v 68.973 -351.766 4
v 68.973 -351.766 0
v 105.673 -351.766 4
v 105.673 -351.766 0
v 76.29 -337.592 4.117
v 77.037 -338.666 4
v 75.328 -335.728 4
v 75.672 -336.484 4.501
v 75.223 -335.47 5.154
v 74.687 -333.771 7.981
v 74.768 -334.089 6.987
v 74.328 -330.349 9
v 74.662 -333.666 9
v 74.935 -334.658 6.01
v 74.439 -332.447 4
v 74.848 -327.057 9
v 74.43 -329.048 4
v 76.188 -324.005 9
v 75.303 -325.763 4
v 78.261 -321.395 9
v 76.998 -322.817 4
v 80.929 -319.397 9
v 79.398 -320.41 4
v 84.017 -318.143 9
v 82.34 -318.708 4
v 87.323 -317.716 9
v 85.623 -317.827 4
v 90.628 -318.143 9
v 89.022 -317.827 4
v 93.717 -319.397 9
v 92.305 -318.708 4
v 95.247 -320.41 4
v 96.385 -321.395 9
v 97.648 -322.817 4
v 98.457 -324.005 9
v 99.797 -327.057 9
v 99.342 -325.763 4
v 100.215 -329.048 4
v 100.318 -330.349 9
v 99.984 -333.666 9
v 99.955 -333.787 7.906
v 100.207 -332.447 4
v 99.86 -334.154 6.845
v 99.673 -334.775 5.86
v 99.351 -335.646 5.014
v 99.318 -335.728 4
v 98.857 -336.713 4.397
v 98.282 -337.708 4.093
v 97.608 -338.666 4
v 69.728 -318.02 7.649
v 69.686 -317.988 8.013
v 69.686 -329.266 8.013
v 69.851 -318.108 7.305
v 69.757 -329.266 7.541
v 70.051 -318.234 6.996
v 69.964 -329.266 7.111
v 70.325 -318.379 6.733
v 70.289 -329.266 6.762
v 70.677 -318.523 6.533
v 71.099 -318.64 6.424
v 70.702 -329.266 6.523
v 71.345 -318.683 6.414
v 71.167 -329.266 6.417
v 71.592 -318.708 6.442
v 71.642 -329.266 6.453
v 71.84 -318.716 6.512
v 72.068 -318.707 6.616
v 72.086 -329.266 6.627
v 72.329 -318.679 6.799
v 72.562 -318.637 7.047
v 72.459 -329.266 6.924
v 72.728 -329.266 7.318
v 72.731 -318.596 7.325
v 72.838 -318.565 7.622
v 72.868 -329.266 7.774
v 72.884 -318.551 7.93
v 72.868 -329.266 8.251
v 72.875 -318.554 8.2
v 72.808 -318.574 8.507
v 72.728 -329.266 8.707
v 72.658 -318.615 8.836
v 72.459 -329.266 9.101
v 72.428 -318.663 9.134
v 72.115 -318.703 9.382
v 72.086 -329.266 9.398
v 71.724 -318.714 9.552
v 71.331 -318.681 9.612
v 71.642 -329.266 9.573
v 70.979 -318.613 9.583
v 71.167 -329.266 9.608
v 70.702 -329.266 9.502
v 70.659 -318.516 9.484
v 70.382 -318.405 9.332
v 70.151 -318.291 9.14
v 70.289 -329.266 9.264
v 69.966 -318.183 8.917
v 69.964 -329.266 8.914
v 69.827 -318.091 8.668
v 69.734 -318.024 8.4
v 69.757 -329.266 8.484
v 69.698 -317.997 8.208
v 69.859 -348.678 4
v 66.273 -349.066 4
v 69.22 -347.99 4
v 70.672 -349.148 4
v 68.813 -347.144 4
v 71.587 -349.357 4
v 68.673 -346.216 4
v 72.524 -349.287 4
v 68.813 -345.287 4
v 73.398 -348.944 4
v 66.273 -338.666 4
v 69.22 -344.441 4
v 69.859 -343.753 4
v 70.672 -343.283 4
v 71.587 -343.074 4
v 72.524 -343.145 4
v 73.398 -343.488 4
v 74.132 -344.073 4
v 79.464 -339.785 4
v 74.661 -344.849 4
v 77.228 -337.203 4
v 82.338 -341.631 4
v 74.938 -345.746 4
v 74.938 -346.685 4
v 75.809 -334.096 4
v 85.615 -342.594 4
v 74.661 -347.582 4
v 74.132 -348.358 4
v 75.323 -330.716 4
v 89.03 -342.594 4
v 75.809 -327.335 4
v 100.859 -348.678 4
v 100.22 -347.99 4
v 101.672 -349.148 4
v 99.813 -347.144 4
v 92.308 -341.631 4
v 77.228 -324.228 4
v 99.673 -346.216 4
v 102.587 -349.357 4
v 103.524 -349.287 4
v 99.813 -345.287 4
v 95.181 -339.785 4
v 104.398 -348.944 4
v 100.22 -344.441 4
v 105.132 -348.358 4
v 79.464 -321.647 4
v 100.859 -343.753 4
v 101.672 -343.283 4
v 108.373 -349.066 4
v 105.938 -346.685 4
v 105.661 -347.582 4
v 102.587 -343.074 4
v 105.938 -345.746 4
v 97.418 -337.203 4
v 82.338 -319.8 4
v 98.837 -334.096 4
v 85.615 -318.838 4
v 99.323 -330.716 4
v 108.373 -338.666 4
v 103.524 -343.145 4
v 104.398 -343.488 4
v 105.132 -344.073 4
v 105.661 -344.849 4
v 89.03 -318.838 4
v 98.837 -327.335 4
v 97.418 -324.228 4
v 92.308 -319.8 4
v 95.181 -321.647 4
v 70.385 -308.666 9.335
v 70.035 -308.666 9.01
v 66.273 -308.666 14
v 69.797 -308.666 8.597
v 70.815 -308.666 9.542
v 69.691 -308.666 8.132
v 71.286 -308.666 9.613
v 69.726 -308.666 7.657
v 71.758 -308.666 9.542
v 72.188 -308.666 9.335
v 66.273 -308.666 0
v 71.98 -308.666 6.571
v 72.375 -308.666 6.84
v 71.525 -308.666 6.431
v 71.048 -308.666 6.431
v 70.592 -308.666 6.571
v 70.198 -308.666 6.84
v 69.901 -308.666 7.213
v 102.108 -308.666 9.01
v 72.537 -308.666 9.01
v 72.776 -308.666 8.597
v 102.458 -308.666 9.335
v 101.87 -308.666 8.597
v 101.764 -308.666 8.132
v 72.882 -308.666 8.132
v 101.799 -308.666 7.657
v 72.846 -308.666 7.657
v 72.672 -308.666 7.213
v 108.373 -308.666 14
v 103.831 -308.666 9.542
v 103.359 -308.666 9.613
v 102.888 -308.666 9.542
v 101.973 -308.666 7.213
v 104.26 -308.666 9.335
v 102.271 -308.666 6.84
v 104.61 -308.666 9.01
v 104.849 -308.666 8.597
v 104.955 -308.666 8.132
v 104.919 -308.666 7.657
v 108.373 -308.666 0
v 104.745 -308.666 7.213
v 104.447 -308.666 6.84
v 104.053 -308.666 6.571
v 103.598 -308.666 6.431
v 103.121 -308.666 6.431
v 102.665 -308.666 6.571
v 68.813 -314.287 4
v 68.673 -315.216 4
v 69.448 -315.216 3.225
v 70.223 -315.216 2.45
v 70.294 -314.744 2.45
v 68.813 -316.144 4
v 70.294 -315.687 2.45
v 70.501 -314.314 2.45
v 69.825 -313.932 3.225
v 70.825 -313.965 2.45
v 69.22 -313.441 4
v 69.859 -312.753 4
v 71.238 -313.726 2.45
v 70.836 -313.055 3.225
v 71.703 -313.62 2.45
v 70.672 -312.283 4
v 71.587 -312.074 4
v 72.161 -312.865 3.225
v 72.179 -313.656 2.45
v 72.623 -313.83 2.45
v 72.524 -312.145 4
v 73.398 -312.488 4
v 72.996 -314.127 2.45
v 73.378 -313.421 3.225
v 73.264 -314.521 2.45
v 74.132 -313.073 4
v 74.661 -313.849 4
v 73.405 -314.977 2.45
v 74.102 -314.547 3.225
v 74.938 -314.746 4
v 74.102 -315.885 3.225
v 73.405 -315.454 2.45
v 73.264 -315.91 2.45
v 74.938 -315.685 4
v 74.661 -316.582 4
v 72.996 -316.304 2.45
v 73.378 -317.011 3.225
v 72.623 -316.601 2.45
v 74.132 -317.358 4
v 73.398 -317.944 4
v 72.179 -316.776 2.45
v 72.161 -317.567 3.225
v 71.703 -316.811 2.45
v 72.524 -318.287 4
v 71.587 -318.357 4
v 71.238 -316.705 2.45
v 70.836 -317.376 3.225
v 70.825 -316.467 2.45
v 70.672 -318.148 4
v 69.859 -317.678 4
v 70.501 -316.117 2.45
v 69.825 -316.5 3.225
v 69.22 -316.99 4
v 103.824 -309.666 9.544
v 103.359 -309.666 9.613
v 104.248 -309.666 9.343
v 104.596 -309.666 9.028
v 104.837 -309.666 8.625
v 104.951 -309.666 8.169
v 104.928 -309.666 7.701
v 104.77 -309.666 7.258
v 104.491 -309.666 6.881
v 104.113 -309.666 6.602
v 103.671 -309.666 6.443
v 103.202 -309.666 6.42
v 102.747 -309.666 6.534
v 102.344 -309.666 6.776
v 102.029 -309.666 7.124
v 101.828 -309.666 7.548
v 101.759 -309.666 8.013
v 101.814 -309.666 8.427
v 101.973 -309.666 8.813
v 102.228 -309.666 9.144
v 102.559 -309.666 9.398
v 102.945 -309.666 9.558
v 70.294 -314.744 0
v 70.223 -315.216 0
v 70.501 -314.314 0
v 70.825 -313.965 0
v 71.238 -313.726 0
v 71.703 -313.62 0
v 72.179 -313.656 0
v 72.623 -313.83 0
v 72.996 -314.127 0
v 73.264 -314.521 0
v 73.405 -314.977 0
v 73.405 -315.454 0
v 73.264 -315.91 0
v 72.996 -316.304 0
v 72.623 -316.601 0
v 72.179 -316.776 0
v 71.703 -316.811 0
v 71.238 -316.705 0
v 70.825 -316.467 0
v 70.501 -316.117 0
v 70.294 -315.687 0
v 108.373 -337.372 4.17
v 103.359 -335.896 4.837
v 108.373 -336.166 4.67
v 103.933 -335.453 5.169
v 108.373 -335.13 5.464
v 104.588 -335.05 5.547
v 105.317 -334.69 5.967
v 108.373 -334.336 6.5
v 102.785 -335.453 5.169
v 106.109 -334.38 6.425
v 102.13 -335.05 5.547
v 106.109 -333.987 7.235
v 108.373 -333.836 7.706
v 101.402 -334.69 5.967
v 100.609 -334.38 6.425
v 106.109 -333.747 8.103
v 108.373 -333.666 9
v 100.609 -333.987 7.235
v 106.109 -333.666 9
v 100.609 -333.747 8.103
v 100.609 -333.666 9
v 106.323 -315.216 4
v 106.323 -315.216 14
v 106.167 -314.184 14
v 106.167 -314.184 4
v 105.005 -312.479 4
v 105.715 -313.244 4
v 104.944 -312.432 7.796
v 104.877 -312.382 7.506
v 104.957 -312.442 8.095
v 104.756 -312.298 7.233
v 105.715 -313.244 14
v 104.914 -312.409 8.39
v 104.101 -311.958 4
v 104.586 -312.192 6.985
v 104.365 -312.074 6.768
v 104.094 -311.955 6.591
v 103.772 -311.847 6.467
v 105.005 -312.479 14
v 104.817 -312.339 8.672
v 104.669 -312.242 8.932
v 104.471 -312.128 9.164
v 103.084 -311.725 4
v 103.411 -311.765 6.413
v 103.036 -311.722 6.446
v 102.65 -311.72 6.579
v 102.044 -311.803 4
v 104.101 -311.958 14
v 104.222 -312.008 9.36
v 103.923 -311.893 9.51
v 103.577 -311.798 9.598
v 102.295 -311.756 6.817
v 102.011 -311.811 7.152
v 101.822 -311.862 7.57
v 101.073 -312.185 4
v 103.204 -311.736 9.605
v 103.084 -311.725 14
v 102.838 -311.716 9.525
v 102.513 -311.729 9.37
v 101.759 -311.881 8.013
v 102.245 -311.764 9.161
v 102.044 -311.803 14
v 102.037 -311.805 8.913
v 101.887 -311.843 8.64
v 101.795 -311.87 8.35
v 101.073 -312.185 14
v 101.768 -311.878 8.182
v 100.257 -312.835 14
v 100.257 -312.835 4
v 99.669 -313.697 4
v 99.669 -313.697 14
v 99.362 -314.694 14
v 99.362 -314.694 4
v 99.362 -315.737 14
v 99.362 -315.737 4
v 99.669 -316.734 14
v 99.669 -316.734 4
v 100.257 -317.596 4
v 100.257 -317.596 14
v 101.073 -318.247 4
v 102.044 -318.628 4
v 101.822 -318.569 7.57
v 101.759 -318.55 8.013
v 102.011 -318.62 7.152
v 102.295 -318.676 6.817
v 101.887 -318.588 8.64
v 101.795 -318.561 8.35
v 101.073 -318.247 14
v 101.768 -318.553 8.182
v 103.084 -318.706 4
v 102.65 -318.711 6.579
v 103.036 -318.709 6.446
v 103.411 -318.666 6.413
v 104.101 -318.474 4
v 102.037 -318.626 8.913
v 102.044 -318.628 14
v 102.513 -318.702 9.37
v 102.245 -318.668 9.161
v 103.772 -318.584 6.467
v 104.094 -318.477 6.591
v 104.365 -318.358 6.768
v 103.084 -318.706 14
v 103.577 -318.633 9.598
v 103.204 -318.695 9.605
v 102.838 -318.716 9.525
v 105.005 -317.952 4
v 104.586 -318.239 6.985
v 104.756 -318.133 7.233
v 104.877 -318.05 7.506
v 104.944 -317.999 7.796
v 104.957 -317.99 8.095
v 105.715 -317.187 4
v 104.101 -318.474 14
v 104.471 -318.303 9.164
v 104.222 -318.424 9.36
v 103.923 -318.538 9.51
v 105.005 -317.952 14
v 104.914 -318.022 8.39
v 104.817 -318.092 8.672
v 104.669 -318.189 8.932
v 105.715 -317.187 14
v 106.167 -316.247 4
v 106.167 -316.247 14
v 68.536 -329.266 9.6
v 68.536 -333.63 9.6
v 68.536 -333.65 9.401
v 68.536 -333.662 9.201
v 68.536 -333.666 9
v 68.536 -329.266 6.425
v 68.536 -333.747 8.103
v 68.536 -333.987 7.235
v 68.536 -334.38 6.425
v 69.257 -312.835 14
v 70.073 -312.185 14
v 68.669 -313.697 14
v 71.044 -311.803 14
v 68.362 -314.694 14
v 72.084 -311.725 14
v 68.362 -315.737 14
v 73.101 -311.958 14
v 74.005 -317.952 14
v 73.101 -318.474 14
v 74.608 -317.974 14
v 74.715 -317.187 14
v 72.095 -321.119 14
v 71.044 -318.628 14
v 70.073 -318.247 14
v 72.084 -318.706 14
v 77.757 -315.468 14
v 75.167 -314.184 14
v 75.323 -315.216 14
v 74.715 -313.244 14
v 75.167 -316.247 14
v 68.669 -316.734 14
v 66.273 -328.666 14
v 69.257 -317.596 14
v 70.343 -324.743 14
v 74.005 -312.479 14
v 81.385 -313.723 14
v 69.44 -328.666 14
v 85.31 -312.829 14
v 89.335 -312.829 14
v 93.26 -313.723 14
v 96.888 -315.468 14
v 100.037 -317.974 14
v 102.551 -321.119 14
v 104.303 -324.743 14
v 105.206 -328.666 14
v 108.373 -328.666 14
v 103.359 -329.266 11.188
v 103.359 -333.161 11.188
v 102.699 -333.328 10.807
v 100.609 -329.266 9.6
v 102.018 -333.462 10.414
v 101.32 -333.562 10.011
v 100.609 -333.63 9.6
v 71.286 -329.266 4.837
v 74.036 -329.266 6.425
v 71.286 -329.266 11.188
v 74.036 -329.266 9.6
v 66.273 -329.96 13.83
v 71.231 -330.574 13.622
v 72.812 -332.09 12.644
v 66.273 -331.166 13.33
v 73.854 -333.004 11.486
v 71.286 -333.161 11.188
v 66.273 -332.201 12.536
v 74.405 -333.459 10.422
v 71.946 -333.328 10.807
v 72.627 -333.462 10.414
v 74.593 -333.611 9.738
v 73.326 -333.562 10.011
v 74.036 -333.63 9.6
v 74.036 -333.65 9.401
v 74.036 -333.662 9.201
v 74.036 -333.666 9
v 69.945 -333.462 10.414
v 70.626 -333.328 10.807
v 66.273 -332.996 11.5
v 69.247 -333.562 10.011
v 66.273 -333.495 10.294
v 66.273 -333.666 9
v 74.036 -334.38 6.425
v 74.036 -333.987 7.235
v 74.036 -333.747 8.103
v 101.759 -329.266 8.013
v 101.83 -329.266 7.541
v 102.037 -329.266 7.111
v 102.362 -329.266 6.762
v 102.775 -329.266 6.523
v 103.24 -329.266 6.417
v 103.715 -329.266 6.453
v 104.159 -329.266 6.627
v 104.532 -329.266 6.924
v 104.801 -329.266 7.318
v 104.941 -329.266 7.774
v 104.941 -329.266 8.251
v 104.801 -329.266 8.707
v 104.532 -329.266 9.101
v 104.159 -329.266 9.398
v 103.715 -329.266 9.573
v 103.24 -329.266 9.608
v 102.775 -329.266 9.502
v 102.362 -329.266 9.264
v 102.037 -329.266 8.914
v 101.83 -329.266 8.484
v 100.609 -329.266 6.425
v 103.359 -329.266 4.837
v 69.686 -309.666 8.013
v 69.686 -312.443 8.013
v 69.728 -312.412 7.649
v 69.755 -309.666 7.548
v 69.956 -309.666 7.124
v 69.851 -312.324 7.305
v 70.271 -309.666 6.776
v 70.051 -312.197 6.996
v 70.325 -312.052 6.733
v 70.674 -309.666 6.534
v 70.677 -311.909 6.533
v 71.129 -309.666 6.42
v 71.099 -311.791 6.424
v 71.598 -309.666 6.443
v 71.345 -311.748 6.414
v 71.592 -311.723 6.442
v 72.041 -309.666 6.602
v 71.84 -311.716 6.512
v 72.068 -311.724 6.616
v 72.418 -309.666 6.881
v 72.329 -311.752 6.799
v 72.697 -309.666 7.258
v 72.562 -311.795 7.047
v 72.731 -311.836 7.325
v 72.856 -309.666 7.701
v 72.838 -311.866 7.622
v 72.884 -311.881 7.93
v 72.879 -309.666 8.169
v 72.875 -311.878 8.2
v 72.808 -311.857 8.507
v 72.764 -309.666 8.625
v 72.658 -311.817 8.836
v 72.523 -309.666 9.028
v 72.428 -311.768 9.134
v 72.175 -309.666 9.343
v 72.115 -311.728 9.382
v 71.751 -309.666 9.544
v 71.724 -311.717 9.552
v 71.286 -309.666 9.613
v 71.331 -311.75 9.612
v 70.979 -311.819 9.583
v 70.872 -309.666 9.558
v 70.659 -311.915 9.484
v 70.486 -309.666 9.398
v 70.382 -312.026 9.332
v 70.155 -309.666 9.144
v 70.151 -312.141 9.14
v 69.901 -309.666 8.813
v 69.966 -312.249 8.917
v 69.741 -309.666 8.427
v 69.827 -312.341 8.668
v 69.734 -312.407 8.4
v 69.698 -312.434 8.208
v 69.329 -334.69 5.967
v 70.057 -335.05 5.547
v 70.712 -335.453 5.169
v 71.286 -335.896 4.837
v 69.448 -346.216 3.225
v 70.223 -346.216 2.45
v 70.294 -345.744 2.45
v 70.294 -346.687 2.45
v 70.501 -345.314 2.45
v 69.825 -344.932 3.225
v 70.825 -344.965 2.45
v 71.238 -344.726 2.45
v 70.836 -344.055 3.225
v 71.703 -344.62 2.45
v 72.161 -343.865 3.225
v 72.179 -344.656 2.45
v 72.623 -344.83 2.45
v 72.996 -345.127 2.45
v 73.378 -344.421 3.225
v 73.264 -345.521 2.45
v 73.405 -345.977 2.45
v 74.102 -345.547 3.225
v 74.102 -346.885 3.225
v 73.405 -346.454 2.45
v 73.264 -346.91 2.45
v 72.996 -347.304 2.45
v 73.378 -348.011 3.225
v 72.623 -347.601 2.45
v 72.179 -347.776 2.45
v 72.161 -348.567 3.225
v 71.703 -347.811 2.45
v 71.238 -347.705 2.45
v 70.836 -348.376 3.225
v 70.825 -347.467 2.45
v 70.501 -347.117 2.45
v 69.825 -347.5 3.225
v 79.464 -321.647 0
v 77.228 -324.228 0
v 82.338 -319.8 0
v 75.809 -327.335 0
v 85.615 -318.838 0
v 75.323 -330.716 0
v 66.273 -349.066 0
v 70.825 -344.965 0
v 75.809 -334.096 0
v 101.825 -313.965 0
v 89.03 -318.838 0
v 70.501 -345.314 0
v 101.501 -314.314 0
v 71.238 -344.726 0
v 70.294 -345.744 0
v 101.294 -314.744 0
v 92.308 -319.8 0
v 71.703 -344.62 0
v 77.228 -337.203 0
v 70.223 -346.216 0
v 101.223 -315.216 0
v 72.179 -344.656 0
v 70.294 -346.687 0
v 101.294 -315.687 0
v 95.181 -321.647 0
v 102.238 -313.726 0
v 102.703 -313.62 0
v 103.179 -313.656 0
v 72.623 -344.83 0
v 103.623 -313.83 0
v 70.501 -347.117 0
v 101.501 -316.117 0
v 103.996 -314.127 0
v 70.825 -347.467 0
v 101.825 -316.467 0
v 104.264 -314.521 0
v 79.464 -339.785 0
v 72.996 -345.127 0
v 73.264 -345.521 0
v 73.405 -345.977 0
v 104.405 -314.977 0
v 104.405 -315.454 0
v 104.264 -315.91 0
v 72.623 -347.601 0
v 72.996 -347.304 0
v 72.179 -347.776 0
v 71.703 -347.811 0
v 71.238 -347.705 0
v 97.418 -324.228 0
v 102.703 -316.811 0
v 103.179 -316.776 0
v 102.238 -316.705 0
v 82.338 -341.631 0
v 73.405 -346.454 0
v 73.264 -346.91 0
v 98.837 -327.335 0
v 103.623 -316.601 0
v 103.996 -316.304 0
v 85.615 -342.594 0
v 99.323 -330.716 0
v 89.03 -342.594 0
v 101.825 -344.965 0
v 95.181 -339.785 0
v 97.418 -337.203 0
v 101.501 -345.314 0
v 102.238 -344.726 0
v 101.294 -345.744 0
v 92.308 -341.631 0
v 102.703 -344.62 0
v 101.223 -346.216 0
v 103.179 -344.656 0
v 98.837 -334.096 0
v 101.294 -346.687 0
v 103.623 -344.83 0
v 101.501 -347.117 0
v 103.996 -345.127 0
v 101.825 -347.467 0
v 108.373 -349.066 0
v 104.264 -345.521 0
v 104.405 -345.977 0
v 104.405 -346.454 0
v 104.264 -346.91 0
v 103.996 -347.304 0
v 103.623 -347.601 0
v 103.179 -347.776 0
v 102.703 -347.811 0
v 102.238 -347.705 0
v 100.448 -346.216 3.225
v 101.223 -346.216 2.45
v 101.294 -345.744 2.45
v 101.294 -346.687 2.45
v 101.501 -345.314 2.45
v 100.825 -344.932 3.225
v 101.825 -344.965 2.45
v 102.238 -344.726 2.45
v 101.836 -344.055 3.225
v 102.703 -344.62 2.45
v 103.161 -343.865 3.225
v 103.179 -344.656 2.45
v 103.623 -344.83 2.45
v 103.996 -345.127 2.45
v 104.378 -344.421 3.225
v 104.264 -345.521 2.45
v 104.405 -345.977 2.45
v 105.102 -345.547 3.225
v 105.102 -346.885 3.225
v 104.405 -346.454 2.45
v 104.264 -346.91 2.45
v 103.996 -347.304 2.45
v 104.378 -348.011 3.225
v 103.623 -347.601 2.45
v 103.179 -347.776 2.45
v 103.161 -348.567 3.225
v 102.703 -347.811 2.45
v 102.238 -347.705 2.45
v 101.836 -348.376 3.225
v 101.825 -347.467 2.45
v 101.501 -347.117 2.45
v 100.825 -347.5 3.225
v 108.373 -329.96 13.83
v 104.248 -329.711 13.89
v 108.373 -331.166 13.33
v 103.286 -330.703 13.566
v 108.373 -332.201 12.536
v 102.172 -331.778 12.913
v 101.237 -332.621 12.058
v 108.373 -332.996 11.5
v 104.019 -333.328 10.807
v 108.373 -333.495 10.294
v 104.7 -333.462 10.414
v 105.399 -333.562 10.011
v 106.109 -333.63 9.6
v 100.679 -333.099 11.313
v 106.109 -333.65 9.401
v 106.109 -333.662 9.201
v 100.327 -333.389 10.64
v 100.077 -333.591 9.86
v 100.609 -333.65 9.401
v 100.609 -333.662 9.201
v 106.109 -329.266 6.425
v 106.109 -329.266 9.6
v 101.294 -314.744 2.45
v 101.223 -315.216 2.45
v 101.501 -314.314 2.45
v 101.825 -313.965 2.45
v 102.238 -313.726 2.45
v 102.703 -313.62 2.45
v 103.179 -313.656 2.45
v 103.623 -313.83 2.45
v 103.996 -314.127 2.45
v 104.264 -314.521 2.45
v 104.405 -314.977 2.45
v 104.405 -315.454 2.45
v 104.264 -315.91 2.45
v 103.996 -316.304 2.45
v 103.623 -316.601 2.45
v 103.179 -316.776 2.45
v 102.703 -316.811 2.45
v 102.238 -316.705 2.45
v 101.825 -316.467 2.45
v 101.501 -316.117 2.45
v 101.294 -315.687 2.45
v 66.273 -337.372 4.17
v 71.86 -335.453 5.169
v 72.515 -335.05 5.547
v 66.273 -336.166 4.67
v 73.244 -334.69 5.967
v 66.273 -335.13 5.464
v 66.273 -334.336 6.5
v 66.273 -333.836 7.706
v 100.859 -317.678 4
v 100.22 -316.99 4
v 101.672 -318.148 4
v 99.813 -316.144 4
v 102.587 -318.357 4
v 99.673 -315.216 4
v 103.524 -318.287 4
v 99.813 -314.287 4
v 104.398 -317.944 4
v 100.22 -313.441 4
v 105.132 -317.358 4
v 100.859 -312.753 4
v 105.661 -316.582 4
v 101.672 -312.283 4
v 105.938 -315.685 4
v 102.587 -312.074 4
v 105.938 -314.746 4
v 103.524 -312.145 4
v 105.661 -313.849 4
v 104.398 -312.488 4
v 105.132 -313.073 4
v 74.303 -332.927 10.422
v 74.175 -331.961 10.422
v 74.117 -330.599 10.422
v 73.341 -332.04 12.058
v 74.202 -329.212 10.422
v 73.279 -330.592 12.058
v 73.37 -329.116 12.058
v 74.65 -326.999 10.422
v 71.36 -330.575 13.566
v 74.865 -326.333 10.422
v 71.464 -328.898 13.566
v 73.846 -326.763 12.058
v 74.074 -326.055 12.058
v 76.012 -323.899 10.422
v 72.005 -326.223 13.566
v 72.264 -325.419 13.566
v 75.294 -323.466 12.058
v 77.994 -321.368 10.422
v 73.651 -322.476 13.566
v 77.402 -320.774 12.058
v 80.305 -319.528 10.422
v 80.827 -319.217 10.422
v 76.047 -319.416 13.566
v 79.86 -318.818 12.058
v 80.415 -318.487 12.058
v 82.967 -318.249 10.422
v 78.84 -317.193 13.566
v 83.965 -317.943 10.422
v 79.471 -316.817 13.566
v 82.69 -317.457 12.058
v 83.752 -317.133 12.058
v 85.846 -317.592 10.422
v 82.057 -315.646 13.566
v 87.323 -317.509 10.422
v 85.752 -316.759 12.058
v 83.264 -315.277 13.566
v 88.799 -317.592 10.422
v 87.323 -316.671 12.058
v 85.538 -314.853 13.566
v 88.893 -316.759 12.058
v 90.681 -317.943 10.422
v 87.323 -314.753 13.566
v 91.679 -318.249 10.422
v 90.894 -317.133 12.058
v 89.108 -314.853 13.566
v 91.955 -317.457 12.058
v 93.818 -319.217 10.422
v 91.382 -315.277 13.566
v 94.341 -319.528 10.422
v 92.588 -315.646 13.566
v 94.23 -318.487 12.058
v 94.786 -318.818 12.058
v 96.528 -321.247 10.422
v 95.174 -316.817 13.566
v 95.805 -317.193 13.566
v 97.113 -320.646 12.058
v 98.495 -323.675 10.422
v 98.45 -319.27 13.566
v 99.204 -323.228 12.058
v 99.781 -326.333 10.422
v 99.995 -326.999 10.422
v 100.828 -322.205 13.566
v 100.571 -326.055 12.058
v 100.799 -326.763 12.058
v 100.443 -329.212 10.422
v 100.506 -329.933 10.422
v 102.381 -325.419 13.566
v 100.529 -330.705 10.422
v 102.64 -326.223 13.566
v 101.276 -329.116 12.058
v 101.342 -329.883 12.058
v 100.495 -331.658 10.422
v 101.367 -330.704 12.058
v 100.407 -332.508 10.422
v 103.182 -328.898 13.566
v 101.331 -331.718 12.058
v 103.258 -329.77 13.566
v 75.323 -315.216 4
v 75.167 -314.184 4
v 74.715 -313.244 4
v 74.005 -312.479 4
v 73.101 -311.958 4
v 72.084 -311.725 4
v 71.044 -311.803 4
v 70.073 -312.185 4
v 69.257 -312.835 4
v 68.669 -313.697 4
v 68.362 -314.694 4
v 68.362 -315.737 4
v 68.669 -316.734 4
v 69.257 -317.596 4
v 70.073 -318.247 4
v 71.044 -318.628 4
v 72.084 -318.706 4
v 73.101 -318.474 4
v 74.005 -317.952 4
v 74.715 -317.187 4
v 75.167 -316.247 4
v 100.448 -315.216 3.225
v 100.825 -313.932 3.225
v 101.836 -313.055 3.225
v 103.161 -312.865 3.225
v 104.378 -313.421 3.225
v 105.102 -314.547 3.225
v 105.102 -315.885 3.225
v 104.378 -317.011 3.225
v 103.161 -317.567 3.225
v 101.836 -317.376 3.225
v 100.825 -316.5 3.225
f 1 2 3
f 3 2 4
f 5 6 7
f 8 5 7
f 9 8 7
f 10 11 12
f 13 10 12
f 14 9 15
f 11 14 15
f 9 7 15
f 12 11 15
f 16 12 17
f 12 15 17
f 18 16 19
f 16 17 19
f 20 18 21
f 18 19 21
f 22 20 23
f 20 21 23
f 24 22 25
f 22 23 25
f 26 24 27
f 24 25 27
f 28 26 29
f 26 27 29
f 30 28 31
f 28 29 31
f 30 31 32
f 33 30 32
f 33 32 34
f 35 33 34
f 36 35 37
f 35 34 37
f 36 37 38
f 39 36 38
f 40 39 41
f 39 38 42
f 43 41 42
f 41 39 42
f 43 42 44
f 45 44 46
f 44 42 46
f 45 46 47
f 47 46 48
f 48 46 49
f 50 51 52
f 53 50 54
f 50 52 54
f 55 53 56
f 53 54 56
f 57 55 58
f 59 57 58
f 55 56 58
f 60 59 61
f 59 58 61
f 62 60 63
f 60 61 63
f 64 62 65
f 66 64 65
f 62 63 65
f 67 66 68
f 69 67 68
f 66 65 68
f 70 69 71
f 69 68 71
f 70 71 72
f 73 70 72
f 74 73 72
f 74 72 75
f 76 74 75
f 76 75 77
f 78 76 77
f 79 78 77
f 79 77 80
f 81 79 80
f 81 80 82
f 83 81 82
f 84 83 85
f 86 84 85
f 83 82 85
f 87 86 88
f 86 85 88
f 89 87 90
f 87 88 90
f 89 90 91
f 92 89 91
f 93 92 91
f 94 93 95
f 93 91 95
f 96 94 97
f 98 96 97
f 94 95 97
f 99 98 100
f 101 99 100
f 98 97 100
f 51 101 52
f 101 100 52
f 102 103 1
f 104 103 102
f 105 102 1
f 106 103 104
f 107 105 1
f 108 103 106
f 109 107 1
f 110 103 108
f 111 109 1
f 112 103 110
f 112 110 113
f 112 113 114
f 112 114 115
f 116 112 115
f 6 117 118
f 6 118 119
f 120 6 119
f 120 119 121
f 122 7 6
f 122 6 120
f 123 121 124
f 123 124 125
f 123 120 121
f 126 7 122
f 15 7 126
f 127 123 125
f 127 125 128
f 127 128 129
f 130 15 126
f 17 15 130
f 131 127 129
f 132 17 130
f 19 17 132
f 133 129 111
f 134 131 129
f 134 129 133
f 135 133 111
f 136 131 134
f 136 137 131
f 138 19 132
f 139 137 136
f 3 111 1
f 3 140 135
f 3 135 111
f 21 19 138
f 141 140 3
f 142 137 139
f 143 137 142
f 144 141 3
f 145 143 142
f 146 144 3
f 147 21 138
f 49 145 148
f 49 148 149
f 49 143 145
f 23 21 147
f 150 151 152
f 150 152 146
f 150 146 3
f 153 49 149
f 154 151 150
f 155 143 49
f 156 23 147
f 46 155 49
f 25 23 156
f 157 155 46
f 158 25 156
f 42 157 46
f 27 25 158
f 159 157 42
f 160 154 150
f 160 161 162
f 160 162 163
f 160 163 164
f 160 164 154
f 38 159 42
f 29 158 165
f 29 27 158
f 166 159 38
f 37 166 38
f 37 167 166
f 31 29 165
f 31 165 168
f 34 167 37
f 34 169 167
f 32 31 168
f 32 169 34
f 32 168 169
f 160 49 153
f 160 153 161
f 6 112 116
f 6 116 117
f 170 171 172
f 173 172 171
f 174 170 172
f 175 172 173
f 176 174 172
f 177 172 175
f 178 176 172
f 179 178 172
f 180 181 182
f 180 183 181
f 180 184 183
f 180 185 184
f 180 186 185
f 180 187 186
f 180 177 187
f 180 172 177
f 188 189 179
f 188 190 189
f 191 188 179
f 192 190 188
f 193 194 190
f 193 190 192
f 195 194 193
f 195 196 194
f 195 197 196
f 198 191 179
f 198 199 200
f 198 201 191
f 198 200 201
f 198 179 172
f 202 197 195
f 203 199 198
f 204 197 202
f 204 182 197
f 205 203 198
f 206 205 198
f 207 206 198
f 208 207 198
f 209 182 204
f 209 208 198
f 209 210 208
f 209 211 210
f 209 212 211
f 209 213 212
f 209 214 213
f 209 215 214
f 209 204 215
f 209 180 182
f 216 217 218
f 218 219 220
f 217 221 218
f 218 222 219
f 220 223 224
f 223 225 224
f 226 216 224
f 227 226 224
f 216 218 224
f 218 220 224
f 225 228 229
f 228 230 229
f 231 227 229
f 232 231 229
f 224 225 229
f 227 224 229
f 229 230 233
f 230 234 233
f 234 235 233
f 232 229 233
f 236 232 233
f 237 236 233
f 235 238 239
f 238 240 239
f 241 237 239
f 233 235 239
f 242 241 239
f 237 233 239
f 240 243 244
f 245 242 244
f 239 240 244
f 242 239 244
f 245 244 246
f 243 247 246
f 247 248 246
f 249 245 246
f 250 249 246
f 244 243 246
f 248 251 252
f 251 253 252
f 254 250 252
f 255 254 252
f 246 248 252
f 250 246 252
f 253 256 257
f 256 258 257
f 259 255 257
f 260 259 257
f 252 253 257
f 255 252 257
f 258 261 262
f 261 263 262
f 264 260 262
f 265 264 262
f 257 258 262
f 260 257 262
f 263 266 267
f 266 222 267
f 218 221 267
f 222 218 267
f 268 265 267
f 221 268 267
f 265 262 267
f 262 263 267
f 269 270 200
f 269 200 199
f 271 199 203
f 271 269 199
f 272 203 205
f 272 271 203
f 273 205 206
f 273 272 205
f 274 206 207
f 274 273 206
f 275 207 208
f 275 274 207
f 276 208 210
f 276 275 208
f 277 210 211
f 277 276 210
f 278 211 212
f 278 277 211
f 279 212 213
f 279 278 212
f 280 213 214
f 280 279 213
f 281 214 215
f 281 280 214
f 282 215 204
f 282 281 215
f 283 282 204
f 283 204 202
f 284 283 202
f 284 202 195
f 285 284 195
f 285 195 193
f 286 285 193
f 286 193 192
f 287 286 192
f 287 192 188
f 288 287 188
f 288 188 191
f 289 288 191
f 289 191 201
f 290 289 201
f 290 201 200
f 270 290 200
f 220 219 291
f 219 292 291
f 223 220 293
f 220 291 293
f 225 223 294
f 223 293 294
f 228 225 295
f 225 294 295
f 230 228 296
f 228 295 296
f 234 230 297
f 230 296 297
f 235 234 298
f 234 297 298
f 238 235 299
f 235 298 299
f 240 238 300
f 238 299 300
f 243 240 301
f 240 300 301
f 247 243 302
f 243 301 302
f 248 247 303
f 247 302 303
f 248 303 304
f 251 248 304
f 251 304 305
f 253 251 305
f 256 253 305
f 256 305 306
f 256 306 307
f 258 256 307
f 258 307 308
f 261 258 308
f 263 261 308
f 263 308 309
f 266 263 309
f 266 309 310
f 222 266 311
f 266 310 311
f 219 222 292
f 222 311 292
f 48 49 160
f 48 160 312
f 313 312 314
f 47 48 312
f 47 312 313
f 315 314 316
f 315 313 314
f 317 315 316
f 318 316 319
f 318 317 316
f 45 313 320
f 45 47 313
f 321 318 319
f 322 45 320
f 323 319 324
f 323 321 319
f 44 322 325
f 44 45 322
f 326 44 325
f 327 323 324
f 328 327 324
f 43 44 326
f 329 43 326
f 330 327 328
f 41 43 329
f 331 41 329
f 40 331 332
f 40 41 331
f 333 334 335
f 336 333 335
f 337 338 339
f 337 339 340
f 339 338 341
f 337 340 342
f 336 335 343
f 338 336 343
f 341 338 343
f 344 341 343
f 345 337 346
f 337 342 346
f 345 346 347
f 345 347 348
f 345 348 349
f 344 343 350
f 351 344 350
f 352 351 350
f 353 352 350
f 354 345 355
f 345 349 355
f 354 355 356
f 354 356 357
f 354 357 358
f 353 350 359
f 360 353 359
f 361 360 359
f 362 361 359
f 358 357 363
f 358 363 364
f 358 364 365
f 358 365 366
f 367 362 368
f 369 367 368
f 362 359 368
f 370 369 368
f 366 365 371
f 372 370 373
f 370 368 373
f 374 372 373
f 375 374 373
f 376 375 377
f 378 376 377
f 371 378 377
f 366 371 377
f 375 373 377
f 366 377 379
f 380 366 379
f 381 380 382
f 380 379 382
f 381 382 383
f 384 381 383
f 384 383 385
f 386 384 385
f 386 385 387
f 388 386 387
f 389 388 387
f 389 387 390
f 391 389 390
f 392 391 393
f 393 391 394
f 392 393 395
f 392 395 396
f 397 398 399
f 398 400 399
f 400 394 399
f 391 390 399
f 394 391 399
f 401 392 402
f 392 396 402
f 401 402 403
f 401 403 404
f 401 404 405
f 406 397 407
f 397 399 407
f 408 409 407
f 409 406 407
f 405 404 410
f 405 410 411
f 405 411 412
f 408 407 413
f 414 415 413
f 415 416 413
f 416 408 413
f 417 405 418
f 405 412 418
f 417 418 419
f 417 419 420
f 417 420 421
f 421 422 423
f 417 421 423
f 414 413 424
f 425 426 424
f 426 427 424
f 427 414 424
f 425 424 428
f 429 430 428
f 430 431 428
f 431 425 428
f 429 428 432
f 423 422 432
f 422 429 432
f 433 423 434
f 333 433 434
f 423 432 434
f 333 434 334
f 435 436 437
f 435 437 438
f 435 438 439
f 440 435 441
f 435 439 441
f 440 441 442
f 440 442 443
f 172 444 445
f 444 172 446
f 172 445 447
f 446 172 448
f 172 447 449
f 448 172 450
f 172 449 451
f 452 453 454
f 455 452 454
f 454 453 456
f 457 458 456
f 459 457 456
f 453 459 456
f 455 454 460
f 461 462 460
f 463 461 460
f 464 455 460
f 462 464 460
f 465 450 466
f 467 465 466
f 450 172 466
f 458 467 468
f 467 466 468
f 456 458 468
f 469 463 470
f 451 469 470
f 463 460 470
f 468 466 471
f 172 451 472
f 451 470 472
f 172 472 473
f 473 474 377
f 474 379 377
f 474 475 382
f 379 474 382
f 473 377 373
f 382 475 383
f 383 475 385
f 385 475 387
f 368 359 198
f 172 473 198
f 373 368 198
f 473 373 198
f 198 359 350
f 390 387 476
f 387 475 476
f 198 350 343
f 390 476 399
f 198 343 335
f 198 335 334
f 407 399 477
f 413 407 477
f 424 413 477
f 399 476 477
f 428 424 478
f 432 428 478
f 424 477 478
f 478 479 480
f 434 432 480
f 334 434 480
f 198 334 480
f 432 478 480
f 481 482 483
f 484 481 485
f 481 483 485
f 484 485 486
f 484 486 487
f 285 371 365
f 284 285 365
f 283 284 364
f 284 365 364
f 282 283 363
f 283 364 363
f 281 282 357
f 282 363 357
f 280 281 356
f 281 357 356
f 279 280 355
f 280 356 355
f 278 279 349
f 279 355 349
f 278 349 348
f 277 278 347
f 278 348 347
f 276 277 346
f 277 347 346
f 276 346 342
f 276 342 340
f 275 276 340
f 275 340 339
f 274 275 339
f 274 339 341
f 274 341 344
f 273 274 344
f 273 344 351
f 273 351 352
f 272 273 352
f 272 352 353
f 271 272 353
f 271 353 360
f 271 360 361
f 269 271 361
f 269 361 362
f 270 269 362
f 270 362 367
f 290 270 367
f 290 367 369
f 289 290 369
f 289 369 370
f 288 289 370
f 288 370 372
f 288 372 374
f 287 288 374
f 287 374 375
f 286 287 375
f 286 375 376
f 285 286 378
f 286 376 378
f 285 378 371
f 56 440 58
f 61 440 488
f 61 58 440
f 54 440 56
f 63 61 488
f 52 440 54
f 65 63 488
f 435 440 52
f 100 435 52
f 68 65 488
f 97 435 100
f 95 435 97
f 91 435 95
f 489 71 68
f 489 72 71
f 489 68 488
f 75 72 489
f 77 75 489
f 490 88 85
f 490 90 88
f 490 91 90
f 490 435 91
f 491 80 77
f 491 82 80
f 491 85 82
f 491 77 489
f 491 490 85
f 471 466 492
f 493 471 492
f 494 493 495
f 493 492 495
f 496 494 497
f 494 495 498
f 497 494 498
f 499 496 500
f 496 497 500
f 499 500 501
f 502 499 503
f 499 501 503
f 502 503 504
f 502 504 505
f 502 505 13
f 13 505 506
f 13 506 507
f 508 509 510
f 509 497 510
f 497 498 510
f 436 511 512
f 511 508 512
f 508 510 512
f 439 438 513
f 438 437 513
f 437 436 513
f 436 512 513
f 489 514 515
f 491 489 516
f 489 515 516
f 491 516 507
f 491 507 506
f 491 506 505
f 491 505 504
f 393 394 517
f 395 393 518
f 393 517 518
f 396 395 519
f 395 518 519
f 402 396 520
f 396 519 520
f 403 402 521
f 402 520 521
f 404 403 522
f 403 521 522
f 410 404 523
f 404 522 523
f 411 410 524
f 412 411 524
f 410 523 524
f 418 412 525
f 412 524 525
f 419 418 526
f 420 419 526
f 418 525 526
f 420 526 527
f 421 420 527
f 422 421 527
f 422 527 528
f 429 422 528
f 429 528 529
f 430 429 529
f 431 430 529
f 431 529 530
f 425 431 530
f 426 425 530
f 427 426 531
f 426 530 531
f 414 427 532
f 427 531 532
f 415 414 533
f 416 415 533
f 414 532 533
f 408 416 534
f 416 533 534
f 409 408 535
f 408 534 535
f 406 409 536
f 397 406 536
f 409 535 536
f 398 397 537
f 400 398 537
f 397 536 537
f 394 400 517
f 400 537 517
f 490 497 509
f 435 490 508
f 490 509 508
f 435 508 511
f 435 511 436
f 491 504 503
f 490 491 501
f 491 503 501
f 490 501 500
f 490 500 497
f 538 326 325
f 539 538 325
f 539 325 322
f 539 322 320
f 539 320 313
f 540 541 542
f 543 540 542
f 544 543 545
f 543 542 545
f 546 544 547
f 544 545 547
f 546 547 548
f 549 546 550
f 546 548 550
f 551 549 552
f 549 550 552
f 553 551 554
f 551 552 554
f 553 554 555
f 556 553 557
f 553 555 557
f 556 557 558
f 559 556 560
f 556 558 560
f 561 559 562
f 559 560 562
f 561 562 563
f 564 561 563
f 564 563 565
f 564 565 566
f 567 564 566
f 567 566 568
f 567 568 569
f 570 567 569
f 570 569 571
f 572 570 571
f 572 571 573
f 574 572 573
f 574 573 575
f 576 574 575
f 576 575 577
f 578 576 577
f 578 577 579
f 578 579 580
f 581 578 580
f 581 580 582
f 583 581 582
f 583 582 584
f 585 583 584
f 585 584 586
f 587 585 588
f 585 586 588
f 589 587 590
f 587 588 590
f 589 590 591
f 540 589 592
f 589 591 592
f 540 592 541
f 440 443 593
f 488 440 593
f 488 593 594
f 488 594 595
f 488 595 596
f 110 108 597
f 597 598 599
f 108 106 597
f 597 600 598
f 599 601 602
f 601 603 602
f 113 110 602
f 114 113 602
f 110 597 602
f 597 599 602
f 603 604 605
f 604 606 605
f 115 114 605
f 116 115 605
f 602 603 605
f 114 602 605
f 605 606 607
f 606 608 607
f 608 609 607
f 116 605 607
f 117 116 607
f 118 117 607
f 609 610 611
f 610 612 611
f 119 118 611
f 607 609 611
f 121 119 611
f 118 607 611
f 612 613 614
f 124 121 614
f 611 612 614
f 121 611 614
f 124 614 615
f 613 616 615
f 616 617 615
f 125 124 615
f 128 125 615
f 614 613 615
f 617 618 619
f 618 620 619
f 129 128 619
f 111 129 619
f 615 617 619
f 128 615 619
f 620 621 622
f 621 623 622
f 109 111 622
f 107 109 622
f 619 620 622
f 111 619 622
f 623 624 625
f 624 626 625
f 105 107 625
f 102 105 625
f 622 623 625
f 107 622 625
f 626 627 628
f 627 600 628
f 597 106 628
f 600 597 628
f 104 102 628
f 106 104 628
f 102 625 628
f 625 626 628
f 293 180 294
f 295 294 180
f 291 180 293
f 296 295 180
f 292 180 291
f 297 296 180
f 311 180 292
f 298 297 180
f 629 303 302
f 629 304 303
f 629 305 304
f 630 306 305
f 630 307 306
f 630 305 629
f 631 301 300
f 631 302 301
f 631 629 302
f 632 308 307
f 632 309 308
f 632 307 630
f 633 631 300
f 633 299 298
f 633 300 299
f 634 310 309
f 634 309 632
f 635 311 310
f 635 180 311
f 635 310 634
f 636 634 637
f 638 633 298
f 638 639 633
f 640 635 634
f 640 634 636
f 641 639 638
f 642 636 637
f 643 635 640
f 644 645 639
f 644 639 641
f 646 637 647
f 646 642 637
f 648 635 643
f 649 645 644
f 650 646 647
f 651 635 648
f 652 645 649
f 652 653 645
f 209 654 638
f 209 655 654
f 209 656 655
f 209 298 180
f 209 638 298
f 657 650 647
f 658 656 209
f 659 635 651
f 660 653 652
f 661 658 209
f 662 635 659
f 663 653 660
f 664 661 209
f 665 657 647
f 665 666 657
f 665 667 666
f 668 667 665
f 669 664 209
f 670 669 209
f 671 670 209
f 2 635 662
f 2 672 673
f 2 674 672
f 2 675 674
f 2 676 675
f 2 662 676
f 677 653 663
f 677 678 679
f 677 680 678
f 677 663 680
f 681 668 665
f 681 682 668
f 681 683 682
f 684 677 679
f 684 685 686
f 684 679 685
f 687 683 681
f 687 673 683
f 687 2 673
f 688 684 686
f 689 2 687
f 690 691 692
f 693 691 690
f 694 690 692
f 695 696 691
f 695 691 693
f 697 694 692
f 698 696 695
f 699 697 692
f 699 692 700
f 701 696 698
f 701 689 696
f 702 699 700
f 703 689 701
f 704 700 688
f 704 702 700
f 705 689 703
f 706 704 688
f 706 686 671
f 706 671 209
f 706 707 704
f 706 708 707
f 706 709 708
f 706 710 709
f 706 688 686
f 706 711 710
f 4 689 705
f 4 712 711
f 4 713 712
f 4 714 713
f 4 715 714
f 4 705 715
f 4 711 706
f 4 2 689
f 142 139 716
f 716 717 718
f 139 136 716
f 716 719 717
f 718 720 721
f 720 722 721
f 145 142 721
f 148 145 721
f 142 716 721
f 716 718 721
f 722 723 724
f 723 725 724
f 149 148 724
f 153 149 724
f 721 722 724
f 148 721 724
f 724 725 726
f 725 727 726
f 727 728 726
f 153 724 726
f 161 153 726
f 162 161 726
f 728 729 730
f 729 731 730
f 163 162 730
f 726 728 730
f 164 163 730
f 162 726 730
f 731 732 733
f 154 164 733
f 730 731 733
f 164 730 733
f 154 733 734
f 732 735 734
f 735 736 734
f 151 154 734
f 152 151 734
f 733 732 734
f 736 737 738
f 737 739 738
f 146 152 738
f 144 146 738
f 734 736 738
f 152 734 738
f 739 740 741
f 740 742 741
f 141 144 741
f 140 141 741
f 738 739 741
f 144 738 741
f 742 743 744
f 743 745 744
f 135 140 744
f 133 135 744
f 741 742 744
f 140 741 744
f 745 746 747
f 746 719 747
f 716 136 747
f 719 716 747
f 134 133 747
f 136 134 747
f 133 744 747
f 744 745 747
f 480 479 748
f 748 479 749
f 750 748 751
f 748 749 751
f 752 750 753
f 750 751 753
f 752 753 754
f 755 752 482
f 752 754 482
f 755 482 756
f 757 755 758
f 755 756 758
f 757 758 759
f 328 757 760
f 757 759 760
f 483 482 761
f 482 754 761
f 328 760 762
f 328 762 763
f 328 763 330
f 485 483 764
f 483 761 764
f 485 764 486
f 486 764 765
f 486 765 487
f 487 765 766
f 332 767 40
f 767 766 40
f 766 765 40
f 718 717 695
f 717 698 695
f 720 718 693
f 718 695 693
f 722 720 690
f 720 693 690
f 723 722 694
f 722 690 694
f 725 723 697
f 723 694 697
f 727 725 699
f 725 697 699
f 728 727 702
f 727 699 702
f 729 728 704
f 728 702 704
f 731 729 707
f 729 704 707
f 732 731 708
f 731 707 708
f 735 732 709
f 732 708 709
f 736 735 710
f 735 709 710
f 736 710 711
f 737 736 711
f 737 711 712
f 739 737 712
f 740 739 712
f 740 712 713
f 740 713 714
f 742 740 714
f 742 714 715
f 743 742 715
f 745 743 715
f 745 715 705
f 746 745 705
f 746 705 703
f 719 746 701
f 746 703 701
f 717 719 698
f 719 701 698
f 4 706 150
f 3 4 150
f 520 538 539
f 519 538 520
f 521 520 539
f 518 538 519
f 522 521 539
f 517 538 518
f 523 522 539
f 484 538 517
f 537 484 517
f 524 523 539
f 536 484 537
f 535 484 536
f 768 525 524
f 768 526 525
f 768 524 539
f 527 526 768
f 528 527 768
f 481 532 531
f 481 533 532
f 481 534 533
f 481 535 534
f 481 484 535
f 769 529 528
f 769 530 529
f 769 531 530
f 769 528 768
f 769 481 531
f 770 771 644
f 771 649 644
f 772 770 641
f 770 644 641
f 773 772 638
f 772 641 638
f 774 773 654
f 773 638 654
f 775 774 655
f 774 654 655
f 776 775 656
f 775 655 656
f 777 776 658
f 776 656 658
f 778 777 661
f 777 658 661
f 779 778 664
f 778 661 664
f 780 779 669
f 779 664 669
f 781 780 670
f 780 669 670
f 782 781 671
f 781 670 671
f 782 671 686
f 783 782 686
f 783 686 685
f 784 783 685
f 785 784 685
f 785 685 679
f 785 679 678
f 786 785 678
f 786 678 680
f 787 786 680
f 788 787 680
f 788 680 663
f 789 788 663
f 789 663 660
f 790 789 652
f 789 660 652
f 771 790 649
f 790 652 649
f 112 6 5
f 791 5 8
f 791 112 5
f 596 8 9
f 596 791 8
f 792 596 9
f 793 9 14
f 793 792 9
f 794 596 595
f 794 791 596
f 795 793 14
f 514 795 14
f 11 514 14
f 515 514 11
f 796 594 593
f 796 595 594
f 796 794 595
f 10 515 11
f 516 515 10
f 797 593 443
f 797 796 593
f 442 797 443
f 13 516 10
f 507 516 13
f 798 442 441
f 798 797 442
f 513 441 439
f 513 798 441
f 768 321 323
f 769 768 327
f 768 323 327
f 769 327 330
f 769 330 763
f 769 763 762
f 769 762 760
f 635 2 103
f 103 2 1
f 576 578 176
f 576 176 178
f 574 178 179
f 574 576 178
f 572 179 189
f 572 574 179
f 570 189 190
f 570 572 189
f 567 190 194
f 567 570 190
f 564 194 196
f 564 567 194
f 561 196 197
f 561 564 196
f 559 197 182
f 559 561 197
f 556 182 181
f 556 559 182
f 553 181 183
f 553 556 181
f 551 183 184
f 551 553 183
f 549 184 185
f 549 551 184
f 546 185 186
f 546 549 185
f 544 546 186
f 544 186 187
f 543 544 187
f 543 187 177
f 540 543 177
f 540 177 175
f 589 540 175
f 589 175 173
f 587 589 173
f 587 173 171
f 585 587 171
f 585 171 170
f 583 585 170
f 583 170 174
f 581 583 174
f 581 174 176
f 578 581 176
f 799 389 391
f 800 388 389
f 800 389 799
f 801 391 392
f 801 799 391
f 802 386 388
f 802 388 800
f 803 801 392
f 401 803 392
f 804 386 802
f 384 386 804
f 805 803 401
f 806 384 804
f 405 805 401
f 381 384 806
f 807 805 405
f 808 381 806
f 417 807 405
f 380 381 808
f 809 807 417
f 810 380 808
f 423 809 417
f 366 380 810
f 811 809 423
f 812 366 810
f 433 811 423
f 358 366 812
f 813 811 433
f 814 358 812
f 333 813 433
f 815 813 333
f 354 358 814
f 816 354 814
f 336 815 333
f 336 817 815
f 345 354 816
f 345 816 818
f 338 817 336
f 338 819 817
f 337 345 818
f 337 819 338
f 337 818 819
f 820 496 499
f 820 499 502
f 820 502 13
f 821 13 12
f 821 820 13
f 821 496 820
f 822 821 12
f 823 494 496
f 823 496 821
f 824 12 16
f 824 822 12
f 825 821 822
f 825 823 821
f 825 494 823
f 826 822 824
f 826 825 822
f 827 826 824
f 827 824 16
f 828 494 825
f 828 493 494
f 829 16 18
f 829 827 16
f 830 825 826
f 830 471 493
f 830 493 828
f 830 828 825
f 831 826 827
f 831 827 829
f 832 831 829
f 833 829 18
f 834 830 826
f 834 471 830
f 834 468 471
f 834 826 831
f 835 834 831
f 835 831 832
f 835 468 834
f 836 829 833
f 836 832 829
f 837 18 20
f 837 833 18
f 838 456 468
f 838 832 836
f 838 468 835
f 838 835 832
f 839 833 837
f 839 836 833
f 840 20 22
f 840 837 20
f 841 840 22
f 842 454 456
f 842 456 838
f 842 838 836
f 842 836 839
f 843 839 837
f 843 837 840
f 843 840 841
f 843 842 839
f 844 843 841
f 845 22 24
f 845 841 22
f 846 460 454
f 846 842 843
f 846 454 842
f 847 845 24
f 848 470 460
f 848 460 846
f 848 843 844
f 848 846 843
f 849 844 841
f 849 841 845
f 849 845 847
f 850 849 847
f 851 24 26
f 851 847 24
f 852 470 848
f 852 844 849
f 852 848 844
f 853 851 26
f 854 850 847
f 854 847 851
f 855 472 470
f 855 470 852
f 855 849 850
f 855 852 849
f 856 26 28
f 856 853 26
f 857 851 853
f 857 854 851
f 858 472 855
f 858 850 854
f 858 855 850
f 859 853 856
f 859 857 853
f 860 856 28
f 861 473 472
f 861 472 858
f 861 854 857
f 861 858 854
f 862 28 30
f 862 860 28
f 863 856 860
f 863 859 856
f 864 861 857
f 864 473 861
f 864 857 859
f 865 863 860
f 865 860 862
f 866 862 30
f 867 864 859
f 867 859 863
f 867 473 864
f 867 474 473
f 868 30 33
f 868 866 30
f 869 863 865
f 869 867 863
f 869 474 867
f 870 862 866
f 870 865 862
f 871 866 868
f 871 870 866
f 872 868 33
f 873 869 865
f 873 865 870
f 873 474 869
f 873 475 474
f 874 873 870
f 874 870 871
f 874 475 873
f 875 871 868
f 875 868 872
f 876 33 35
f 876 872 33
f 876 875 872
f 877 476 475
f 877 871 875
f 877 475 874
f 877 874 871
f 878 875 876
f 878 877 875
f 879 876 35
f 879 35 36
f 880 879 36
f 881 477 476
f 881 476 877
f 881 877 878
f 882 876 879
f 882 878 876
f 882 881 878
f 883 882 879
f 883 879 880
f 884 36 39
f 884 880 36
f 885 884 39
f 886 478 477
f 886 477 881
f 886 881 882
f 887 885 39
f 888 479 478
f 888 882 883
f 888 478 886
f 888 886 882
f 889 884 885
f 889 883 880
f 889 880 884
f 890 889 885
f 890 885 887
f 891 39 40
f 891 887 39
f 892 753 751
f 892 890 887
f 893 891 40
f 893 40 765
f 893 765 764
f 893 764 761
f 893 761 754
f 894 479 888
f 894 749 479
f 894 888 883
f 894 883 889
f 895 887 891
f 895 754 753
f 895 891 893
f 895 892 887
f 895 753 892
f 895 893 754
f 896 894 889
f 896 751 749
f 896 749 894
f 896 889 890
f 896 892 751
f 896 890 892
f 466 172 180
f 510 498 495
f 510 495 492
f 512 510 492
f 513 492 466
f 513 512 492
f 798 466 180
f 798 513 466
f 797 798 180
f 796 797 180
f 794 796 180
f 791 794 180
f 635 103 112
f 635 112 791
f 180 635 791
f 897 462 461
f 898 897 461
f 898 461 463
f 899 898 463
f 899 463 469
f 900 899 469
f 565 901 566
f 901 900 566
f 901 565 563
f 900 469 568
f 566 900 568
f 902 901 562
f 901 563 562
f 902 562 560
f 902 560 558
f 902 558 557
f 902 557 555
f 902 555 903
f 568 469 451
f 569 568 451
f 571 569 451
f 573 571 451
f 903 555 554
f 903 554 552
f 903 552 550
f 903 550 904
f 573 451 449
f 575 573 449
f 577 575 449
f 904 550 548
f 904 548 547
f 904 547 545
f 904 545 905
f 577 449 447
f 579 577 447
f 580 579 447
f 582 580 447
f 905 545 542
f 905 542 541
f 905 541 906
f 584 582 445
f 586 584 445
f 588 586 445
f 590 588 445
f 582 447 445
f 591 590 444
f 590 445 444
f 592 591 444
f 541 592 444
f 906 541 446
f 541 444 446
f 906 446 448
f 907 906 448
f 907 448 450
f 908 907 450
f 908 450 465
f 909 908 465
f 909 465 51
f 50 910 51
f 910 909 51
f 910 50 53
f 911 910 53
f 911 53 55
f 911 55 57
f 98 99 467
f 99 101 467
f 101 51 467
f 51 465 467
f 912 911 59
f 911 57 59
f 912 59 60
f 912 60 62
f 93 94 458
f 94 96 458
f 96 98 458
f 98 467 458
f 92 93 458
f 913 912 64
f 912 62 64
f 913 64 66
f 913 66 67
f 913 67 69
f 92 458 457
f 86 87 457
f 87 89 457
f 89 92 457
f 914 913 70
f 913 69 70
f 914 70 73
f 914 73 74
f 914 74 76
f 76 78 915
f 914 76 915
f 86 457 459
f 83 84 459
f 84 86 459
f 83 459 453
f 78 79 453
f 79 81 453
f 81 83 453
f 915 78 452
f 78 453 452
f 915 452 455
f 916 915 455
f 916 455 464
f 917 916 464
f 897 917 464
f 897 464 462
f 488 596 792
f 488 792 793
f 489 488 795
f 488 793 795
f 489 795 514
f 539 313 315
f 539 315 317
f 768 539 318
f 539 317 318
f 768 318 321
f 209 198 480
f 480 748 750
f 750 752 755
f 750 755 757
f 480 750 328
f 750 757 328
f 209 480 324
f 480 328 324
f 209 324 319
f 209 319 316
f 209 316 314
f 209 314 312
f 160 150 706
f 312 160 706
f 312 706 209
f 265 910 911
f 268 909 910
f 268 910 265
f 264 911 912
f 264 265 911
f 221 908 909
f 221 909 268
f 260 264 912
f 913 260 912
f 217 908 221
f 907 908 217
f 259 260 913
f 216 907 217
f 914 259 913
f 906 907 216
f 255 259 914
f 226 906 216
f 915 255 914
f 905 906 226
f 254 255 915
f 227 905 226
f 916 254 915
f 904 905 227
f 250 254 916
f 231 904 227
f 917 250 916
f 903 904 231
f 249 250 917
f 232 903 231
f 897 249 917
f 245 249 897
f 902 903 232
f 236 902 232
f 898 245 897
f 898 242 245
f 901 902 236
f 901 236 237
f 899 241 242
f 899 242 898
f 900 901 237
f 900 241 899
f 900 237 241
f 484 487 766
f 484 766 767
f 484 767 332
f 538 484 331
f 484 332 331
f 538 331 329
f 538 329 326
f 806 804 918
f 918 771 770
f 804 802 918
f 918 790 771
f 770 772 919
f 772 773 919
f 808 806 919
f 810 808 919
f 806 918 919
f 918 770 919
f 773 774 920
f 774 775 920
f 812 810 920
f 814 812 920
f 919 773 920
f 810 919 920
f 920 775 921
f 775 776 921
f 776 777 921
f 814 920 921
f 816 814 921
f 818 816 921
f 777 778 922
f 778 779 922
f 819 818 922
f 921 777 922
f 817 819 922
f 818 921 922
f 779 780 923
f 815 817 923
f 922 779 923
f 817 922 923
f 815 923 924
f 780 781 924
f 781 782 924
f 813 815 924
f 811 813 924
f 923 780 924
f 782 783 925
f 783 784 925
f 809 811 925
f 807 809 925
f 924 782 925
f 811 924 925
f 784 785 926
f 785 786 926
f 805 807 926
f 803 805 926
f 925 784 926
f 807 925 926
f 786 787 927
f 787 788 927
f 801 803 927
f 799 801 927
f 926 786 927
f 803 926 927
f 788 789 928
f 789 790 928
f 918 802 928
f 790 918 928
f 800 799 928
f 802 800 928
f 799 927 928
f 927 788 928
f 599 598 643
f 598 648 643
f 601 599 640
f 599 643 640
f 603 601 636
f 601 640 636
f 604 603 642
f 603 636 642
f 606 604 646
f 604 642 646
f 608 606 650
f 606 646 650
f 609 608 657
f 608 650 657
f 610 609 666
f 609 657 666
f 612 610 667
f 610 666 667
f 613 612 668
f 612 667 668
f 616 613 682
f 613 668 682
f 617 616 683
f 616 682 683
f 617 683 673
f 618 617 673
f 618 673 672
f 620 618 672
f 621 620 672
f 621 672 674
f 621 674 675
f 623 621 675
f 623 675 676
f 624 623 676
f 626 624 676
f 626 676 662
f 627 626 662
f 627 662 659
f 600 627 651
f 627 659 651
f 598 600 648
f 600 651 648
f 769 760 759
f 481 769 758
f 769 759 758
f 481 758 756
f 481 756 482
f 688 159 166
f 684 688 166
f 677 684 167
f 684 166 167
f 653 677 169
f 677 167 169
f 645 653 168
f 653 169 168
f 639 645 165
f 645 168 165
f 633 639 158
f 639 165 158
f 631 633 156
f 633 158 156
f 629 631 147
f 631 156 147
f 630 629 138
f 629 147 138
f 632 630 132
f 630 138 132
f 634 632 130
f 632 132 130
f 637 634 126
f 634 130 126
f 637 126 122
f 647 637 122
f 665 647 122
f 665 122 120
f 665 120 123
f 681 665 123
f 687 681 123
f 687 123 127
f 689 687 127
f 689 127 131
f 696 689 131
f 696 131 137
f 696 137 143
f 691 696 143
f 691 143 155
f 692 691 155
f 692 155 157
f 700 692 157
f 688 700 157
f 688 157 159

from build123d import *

# Parameters (mm, degrees)
ESBO_O1_W                                            = 42.10000000000001
ESBO_O1_H                                            = 42.10000000000002
RESSALTO_EXTRUS_O1_DEPTH                             = 4
ESBO_O2_R                                            = 12.000000000000007
CORTE_EXTRUS_O1_DEPTH                                = 8
ESCAREADO_PARA_PARAFUSO_DE_M_QUINA_COM_C_D           = 3.2
ESCAREADO_PARA_PARAFUSO_DE_M_QUINA_COM_C_CSINK_D     = 6.3
ESCAREADO_PARA_PARAFUSO_DE_M_QUINA_COM_C_CSINK_ANGLE = 90
RESSALTO_EXTRUS_O2_DEPTH                             = 10
ESBO_O6_R                                            = 3.5000000000000075
CORTE_EXTRUS_O2_DEPTH                                = 10.000000000000002
FURO_COM_FOLGA_DE_M31_D                              = 3.2
FILETE1_R                                            = 5
CORTE_EXTRUS_O6_DEPTH                                = 22.500000000000007
CHANFRO1_SIZE                                        = 2.7
SKETCH2_W                                            = 42.10000000000001
SKETCH2_H                                            = 14.000000000000002
SKETCH2_R                                            = 1.5999999999999908
BOSS_EXTRUDE1_DEPTH                                  = 1


with BuildPart() as part:
    # Esboço1 → Ressalto-extrusão1 (new body)
    with BuildSketch(Plane.XY):
        with Locations((87.32270610713223, -330.71568115646056)):
            Rectangle(ESBO_O1_W, ESBO_O1_H)
    extrude(amount=RESSALTO_EXTRUS_O1_DEPTH)

    # Esboço2 → Corte-extrusão1 (cut)
    with BuildSketch(Plane.XY.offset(4)):
        with Locations((87.32270610713225, -330.71568115646056)):
            Circle(ESBO_O2_R)
    extrude(amount=-CORTE_EXTRUS_O1_DEPTH, mode=Mode.SUBTRACT)

    # Escareado para parafuso de máquina com cabeça chata de M31 (through all)
    with Locations(Plane.XY.offset(4)):
        with Locations((102.822706107, -346.215681156), (102.822706107, -315.215681156), (71.822706107, -315.215681156), (71.822706107, -346.215681156)):
            CounterSinkHole(ESCAREADO_PARA_PARAFUSO_DE_M_QUINA_COM_C_D / 2, ESCAREADO_PARA_PARAFUSO_DE_M_QUINA_COM_C_CSINK_D / 2, counter_sink_angle=ESCAREADO_PARA_PARAFUSO_DE_M_QUINA_COM_C_CSINK_ANGLE)

    # Esboço5 → Ressalto-extrusão2 (add)
    with BuildSketch(Plane.XY.offset(4)):
        with BuildLine():
            Line((99.98357100649832, -333.66568115646055), (108.37270610713225, -333.66568115646055))
            Line((108.37270610713225, -333.66568115646055), (108.37270610713225, -309.66568115646055))
            Line((108.37270610713225, -309.66568115646055), (66.27270610713224, -309.66568115646055))
            Line((66.27270610713224, -309.66568115646055), (66.27270610713224, -333.66568115646055))
            Line((66.27270610713224, -333.66568115646055), (74.66184120776617, -333.66568115646055))
            ThreePointArc((74.66184120776617, -333.66568115646055), (87.32270610713225, -317.71568115646056), (99.98357100649832, -333.66568115646055))
        make_face()
    extrude(amount=RESSALTO_EXTRUS_O2_DEPTH)

    # Esboço6 → Corte-extrusão2 (cut)
    with BuildSketch(Plane.XY.offset(14)):
        with Locations((71.82270610713223, -315.21568115646056)):
            Circle(ESBO_O6_R)
        with Locations((102.82270610713226, -315.21568115646056)):
            Circle(ESBO_O6_R)
    extrude(amount=-CORTE_EXTRUS_O2_DEPTH, mode=Mode.SUBTRACT)

    # Furo com folga de M31 (through all)
    with Locations(Plane(origin=(0, -309.66568115646055, 0), x_dir=(1, 0, 0), z_dir=(0, 1, 0))):
        with Locations((103.359135837, -8.012655369), (71.286276377, -8.012655369)):
            Hole(FURO_COM_FOLGA_DE_M31_D / 2)

    # Filete1
    # the kernel refuses this fillet: 5 mm, written as the material it adds along each edge
    with BuildSketch(Plane(origin=(87.48357100649832, -333.66568115646055, 4), x_dir=(0, -1, 0), z_dir=(1, 0, 0))) as filete1_piece_1_section:
        with BuildLine():
            CenterArc((FILETE1_R, -FILETE1_R), FILETE1_R, 90, 90)
            Line((0, -FILETE1_R), (0, 0))
            Line((0, 0), (FILETE1_R, 0))
        make_face()
    filete1_piece_1 = extrude(amount=20.889135100633922, mode=Mode.PRIVATE)
    filete1_piece_1 = filete1_piece_1 - Plane(origin=(87.32270610713225, -330.71568115646056, 5.015859225762799), x_dir=(-0.9739126845666216, -0.22692307692307614, 0), z_dir=(0, 0, -1)) * Cylinder(12.999999999999995, 62, mode=Mode.PRIVATE)
    filete1_piece_1 = filete1_piece_1 - Plane(origin=(103.359135837, -334.8905504329836, 8.012655369), x_dir=(-1, 0, 0), z_dir=(0, -1, 0)) * Cylinder(1.6, 62, mode=Mode.PRIVATE)
    add(filete1_piece_1)
    with BuildSketch(Plane(origin=(66.27270610713224, -333.66568115646055, 4), x_dir=(0, -1, 0), z_dir=(1, 0, 0))) as filete1_piece_2_section:
        with BuildLine():
            CenterArc((FILETE1_R, -FILETE1_R), FILETE1_R, 90, 90)
            Line((0, -FILETE1_R), (0, 0))
            Line((0, 0), (FILETE1_R, 0))
        make_face()
    filete1_piece_2 = extrude(amount=20.889135100633936, mode=Mode.PRIVATE)
    filete1_piece_2 = filete1_piece_2 - Plane(origin=(87.32270610713225, -330.71568115646056, 5.01585849038902), x_dir=(-0.9739126845666216, -0.22692307692307614, 0), z_dir=(0, 0, -1)) * Cylinder(12.999999999999995, 62, mode=Mode.PRIVATE)
    filete1_piece_2 = filete1_piece_2 - Plane(origin=(71.286276377, -334.8905494522985, 8.012655369), x_dir=(-1, 0, 0), z_dir=(0, -1, 0)) * Cylinder(1.6, 62, mode=Mode.PRIVATE)
    add(filete1_piece_2)
    # the kernel refuses this fillet: 5 mm, written as the material it takes off along each edge
    with BuildSketch(Plane(origin=(87.32270610713225, -330.71568115646056, 14), x_dir=(-0.36935058707522056, -0.9292901289840487, 0), z_dir=(0.9292901289840487, -0.36935058707522056, 0))) as filete1_2_piece_1:
        with BuildLine():
            CenterArc((12.999999999999979 + FILETE1_R, FILETE1_R), FILETE1_R, 180, 90)
            Line((12.999999999999979 + FILETE1_R, 0), (12.999999999999979, 0))
            Line((12.999999999999979, 0), (12.999999999999984, FILETE1_R))
        make_face()
    revolve(axis=Axis((87.32270610713225, -330.71568115646056, 14), (0, 0, -1)), revolution_arc=316.648856226302, mode=Mode.SUBTRACT)
    with BuildSketch(Plane(origin=(87.48357100649832, -333.66568115646055, 14), x_dir=(0, 0, -1), z_dir=(1, 0, 0))) as filete1_2_piece_2:
        with BuildLine():
            CenterArc((FILETE1_R, FILETE1_R), FILETE1_R, 180, 90)
            Line((0, FILETE1_R), (0, 0))
            Line((0, 0), (FILETE1_R, 0))
        make_face()
    extrude(amount=33.38913510063392, mode=Mode.SUBTRACT)
    with BuildSketch(Plane(origin=(53.77270610713224, -333.66568115646055, 14), x_dir=(0, 1, 0), z_dir=(1, 0, 0))) as filete1_2_piece_3:
        with BuildLine():
            CenterArc((FILETE1_R, -FILETE1_R), FILETE1_R, 90, 90)
            Line((0, -FILETE1_R), (0, 0))
            Line((0, 0), (FILETE1_R, 0))
        make_face()
    extrude(amount=33.389135100633936, mode=Mode.SUBTRACT)

    # Esboço13 → Corte-extrusão6 (cut)
    with BuildSketch(Plane.XZ.offset(351.7656811564606)):
        Polygon((74.0362763774125, 9.60036860941331), (71.28627637741243, 11.188081849684735), (68.53627637741243, 9.600368609413174), (68.53627637741253, 6.424942128870199), (71.2862763774126, 4.837228888598795), (74.03627637741259, 6.424942128870374), align=None)
        Polygon((106.10913583685199, 9.600368609413255), (103.35913583685196, 11.188081849684727), (100.60913583685196, 9.600368609413236), (100.60913583685199, 6.424942128870286), (103.359135836852, 4.837228888598834), (106.109135836852, 6.424942128870341), align=None)
    extrude(amount=-CORTE_EXTRUS_O6_DEPTH, mode=Mode.SUBTRACT)

    # Chanfro1
    chanfro1_edges = [part.edges().sort_by_distance(p)[0] for p in [
        (66.27270610713224, -351.7656811564606, 2),
        (108.37270610713225, -351.7656811564606, 2),
    ]]
    chamfer(chanfro1_edges, length=CHANFRO1_SIZE)

    # Sketch2 → Boss-Extrude1 (add)
    with BuildSketch(Plane(origin=(0, -309.66568115646055, 0), x_dir=(1, 0, 0), z_dir=(0, 1, 0))):
        with Locations((87.32270610713223, -7.000000000000001)):
            Rectangle(SKETCH2_W, SKETCH2_H)
        with Locations(Location((71.2862763774125, -8.012655369141836, 0), (0, 0, 270))):
            Circle(SKETCH2_R, mode=Mode.SUBTRACT)
        with Locations(Location((103.35913583685199, -8.012655369141836, 0), (0, 0, 270))):
            Circle(SKETCH2_R, mode=Mode.SUBTRACT)
    extrude(amount=BOSS_EXTRUDE1_DEPTH)


solid = part.part
